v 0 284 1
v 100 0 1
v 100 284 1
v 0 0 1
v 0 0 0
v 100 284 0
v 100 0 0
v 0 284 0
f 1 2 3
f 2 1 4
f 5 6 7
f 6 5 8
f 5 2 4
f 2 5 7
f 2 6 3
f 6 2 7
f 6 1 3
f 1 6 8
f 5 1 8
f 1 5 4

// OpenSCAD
module letter(l,font="Ubuntu-B.dxf",h=100,i=0) {
    union() {	
	linear_extrude( height=h) import(font, layer=l[i]);
	translate([dxf_dim(file=font, name="advx",layer=l[i]),
		   dxf_dim(file=font, name="advy",layer=l[i]),
		   0])
	child();
    }
}

module word(wrd,font="Ubuntu-B.dxf",h=100,i=0) {
    if(i < len(wrd)) {
	letter(wrd,font,h,i) word(wrd,font,h,i+1);
    } else {
	child();
    }
}

union() {
    translate([0,400,0])
    scale(0.1) word("$ % & € £ 012");
    scale(0.1)
    union() {
	letter("H")
	letter("e",h=200)
	letter("l",h=300)
	letter("l",h=400)
	letter("0",h=500);
    };
    translate([0,-400,0])
    scale(0.1)
    union() {
	rotate([0,20,0])
	letter("B")
	rotate([0,20,0])
	letter("e")
	rotate([0,20,0])
	letter("n")
	rotate([0,20,0])
	letter("d")
	rotate([0,20,0])
	letter("y");
    }
}
cube([100,284,1]);
